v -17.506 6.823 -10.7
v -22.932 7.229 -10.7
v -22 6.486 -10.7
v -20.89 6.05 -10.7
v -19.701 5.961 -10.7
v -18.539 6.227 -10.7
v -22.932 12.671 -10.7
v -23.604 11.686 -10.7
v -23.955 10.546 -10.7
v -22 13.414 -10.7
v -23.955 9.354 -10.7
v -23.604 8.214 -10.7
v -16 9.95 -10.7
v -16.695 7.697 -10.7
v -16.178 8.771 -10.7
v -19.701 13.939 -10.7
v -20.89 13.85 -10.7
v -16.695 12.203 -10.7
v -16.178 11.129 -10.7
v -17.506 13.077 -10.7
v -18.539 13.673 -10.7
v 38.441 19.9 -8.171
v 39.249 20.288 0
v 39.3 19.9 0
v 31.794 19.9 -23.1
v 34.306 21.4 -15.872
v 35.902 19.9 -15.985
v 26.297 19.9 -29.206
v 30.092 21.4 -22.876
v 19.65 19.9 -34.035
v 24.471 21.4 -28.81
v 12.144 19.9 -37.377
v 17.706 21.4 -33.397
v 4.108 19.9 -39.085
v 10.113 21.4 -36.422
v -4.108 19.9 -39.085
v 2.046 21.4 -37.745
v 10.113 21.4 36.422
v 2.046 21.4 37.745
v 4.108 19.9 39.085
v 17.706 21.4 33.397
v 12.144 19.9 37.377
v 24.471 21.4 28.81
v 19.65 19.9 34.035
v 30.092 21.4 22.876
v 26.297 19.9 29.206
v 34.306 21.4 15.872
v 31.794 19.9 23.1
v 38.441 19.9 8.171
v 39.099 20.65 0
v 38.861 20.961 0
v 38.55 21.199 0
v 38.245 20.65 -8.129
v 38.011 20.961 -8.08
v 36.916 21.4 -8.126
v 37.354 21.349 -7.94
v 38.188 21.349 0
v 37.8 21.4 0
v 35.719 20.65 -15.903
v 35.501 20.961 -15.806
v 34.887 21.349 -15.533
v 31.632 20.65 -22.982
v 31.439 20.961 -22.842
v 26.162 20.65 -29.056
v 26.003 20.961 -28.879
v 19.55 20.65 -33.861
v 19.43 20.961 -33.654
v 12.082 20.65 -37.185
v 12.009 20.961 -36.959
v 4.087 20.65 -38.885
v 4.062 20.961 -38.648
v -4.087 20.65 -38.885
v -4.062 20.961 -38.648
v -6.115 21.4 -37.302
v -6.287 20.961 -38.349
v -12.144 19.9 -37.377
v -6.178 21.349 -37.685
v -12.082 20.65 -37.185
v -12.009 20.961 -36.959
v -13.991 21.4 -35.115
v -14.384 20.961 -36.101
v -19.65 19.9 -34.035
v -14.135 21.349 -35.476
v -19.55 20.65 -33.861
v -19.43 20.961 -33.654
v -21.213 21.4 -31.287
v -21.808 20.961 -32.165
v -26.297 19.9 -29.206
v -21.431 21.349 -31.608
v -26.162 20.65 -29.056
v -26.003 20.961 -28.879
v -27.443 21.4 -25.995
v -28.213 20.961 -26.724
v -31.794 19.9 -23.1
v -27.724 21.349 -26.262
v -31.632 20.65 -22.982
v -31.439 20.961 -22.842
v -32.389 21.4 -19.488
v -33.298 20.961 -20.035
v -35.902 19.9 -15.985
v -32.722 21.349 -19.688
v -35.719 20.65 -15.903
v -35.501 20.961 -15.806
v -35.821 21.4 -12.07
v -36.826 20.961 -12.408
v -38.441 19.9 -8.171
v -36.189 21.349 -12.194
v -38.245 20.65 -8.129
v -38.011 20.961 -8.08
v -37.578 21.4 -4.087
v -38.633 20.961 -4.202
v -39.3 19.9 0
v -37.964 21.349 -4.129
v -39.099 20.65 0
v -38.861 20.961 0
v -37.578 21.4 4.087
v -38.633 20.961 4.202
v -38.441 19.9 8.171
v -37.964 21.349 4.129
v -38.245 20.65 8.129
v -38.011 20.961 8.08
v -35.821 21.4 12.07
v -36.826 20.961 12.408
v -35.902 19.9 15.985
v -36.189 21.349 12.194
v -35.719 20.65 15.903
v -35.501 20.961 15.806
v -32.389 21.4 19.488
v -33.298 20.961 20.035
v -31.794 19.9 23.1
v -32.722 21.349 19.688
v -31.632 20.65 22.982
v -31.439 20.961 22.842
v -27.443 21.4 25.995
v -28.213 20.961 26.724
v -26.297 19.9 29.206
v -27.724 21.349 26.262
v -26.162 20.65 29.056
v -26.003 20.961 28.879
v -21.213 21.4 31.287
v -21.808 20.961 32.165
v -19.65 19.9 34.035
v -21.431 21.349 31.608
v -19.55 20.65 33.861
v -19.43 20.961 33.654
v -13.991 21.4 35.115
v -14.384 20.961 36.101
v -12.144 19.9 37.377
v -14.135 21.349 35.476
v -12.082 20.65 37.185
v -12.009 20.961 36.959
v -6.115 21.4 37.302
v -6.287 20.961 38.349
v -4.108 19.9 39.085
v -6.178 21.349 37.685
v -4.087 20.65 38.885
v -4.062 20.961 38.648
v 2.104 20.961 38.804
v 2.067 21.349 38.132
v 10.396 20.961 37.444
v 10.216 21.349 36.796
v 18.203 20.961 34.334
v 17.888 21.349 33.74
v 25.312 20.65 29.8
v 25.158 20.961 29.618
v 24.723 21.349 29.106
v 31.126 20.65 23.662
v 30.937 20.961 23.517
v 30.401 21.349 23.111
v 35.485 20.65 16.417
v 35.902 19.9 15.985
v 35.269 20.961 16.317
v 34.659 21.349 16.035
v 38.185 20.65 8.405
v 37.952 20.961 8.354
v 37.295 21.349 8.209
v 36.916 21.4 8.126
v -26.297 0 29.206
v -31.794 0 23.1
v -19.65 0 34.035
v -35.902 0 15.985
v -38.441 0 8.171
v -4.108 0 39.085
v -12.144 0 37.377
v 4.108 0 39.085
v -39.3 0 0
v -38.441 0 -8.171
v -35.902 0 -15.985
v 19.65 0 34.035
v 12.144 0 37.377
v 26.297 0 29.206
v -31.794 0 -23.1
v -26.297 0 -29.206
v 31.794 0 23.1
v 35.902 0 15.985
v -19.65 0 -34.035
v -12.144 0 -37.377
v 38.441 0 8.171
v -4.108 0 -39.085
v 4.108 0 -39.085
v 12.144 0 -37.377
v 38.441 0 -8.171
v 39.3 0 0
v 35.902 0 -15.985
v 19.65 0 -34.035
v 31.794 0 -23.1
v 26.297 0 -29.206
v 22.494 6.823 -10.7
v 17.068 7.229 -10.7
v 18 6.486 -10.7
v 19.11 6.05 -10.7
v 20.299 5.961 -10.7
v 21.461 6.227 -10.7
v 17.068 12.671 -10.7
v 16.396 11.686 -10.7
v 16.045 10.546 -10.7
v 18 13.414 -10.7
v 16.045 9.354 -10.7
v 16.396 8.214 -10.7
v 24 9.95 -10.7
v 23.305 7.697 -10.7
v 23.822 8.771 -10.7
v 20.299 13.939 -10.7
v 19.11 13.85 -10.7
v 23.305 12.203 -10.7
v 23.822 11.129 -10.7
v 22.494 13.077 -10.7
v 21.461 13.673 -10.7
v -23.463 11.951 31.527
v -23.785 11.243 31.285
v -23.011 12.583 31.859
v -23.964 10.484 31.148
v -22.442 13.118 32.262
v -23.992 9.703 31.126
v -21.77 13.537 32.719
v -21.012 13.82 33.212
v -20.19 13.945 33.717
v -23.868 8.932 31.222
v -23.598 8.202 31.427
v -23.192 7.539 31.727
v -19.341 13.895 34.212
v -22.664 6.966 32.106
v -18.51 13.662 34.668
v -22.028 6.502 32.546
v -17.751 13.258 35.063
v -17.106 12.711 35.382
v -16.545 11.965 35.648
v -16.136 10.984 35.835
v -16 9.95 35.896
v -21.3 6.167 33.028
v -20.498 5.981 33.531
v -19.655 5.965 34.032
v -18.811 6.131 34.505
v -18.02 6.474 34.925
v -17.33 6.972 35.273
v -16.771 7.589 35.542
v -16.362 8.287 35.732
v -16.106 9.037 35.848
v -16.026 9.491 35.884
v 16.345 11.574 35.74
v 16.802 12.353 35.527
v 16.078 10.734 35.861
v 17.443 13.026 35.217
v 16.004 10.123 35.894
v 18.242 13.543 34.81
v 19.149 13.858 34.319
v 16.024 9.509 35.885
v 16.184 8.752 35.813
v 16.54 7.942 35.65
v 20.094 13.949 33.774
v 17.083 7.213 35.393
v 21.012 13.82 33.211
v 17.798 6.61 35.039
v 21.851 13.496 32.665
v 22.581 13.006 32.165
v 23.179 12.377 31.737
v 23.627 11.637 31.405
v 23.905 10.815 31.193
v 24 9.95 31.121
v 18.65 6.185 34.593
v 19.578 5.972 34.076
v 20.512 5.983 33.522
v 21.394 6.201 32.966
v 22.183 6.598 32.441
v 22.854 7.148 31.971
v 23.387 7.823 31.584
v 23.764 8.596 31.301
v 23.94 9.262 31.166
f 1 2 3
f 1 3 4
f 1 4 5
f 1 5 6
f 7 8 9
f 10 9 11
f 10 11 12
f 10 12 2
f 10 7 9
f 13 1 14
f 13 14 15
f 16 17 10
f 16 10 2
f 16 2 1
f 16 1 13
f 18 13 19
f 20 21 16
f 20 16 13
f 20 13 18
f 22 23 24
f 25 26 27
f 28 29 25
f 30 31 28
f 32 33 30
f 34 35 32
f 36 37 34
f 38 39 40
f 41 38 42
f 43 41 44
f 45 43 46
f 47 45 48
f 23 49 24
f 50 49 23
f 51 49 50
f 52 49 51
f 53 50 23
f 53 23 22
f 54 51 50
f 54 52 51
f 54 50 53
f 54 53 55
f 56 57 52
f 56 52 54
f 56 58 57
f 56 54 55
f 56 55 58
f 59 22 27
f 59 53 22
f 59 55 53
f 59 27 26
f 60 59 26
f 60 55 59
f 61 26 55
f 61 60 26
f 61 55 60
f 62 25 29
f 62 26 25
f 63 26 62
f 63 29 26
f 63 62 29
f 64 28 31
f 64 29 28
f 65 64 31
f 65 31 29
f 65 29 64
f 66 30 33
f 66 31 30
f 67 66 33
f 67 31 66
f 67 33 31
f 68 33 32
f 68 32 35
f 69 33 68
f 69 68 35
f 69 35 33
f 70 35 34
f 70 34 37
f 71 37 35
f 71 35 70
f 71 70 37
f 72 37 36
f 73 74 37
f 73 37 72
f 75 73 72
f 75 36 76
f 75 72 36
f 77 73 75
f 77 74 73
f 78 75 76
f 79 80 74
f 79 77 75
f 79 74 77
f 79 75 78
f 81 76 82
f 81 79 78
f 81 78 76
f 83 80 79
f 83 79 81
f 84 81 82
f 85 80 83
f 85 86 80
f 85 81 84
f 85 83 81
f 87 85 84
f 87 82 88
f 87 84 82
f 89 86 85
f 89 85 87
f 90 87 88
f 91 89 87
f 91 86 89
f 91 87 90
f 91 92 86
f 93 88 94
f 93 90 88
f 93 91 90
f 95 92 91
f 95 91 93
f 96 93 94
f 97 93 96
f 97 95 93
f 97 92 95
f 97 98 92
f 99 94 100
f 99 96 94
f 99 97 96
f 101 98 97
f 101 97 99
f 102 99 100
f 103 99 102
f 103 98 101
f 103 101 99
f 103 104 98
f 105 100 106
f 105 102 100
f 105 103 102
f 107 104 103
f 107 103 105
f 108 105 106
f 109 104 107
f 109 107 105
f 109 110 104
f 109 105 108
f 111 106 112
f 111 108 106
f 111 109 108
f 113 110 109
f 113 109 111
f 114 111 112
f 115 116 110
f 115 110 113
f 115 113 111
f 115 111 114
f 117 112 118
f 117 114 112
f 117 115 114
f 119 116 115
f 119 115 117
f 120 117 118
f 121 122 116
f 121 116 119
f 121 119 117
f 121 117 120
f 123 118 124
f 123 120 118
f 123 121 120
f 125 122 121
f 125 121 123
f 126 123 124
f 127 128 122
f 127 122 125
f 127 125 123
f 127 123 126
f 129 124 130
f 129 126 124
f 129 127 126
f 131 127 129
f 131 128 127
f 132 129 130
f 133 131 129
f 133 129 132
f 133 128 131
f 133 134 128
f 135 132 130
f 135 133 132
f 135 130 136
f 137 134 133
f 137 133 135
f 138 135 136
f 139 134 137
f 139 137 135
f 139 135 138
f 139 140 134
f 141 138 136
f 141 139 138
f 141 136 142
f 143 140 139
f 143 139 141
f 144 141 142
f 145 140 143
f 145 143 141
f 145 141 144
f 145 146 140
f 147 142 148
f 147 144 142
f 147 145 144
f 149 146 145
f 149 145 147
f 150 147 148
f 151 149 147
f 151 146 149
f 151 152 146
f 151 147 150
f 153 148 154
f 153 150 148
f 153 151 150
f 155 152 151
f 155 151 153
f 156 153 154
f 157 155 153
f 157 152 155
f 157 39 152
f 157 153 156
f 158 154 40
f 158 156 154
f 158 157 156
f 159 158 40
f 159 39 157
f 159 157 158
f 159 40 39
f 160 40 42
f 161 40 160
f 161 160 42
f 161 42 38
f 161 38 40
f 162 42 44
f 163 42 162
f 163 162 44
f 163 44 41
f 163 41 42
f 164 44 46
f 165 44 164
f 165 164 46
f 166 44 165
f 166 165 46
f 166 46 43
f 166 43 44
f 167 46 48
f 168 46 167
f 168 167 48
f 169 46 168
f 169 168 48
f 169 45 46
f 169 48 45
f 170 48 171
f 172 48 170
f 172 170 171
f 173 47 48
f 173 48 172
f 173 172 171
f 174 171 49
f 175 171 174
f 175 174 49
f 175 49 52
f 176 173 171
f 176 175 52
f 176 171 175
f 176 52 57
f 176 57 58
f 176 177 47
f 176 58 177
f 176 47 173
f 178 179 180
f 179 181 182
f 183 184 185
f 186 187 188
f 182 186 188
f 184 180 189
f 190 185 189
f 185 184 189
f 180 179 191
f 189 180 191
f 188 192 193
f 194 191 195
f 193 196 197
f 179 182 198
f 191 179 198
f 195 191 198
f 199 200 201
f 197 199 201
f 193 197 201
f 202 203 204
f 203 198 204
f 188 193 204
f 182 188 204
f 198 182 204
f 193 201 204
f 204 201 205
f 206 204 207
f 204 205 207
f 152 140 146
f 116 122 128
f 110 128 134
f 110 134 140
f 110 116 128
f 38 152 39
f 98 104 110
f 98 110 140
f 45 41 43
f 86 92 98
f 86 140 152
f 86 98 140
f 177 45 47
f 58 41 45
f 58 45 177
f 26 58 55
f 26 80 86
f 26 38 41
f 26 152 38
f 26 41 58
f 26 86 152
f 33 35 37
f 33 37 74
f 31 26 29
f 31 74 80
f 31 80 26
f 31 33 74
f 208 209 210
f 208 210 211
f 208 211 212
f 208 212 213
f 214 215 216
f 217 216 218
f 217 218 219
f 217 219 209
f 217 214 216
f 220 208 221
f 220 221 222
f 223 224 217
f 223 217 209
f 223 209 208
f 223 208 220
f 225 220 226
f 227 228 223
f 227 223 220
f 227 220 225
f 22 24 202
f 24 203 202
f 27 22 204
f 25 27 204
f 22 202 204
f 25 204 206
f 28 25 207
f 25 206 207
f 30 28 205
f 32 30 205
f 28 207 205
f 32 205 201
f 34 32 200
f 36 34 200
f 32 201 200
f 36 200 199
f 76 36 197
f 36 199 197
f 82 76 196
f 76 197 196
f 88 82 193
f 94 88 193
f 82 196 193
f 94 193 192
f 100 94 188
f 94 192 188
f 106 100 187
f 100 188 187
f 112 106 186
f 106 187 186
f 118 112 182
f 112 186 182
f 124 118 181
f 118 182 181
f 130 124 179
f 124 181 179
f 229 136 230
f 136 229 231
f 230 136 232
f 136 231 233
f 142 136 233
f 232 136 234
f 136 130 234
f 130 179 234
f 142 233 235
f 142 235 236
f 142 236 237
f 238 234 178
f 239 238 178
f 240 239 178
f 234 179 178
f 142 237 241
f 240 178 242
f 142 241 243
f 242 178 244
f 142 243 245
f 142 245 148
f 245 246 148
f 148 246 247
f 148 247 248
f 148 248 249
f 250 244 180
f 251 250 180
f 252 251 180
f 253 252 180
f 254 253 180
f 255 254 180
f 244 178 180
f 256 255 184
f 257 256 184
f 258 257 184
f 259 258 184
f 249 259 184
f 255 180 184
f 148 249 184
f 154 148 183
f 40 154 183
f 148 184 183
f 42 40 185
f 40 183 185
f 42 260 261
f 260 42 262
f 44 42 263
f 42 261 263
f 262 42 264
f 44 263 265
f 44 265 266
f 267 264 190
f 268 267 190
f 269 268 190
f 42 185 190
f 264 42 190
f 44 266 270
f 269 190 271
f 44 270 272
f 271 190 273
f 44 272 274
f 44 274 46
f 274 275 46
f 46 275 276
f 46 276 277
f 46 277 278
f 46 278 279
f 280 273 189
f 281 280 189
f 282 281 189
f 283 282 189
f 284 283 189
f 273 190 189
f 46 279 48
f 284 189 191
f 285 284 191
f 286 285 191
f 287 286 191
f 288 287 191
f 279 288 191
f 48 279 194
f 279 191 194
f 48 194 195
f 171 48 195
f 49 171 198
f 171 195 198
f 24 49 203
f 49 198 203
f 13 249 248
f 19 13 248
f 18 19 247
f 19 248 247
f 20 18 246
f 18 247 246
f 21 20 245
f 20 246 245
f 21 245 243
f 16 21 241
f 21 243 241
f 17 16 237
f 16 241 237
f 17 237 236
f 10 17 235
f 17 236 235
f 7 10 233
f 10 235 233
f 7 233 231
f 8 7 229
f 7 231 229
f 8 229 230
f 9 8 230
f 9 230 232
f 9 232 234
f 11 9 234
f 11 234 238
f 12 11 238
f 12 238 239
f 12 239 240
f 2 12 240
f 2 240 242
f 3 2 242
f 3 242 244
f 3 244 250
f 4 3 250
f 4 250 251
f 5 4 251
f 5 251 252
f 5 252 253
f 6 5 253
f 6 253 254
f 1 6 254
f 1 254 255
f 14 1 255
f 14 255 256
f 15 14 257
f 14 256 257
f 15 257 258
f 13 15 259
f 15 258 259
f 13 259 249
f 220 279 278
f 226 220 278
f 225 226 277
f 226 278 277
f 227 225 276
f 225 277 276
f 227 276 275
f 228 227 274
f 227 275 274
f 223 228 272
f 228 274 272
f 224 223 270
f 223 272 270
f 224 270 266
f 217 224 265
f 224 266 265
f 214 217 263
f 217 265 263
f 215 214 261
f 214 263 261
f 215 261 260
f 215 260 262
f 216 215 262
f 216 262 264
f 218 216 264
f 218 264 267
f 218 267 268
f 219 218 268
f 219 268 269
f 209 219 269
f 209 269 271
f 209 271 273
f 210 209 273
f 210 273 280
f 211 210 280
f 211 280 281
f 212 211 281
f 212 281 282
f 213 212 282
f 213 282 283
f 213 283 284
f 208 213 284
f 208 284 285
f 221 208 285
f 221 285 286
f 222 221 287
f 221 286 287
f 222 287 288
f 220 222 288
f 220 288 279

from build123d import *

# Parameters (mm, degrees)
SKETCH1_R           = 39.3
BOSS_EXTRUDE1_DEPTH = 21.4
FILLET1_R           = 1.5
SKETCH2_R           = 4
CUT_EXTRUDE1_DEPTH  = 50


with BuildPart() as part:
    # Sketch1 → Boss-Extrude1 (new body)
    with BuildSketch(Plane(origin=(0, 0, 0), x_dir=(1, 0, 0), z_dir=(0, 1, 0))):
        Circle(SKETCH1_R)
    extrude(amount=BOSS_EXTRUDE1_DEPTH)

    # Fillet1
    fillet1_edges = [part.edges().sort_by_distance(p)[0] for p in [
        (-39.3, 21.4, 0),
    ]]
    fillet(fillet1_edges, radius=FILLET1_R)

    # Sketch2 → Cut-Extrude1 (cut)
    with BuildSketch(Plane.XY.offset(39.3)):
        with Locations((-20, 9.95)):
            Circle(SKETCH2_R)
        with Locations((20, 9.95)):
            Circle(SKETCH2_R)
    extrude(amount=-CUT_EXTRUDE1_DEPTH, mode=Mode.SUBTRACT)


solid = part.part
